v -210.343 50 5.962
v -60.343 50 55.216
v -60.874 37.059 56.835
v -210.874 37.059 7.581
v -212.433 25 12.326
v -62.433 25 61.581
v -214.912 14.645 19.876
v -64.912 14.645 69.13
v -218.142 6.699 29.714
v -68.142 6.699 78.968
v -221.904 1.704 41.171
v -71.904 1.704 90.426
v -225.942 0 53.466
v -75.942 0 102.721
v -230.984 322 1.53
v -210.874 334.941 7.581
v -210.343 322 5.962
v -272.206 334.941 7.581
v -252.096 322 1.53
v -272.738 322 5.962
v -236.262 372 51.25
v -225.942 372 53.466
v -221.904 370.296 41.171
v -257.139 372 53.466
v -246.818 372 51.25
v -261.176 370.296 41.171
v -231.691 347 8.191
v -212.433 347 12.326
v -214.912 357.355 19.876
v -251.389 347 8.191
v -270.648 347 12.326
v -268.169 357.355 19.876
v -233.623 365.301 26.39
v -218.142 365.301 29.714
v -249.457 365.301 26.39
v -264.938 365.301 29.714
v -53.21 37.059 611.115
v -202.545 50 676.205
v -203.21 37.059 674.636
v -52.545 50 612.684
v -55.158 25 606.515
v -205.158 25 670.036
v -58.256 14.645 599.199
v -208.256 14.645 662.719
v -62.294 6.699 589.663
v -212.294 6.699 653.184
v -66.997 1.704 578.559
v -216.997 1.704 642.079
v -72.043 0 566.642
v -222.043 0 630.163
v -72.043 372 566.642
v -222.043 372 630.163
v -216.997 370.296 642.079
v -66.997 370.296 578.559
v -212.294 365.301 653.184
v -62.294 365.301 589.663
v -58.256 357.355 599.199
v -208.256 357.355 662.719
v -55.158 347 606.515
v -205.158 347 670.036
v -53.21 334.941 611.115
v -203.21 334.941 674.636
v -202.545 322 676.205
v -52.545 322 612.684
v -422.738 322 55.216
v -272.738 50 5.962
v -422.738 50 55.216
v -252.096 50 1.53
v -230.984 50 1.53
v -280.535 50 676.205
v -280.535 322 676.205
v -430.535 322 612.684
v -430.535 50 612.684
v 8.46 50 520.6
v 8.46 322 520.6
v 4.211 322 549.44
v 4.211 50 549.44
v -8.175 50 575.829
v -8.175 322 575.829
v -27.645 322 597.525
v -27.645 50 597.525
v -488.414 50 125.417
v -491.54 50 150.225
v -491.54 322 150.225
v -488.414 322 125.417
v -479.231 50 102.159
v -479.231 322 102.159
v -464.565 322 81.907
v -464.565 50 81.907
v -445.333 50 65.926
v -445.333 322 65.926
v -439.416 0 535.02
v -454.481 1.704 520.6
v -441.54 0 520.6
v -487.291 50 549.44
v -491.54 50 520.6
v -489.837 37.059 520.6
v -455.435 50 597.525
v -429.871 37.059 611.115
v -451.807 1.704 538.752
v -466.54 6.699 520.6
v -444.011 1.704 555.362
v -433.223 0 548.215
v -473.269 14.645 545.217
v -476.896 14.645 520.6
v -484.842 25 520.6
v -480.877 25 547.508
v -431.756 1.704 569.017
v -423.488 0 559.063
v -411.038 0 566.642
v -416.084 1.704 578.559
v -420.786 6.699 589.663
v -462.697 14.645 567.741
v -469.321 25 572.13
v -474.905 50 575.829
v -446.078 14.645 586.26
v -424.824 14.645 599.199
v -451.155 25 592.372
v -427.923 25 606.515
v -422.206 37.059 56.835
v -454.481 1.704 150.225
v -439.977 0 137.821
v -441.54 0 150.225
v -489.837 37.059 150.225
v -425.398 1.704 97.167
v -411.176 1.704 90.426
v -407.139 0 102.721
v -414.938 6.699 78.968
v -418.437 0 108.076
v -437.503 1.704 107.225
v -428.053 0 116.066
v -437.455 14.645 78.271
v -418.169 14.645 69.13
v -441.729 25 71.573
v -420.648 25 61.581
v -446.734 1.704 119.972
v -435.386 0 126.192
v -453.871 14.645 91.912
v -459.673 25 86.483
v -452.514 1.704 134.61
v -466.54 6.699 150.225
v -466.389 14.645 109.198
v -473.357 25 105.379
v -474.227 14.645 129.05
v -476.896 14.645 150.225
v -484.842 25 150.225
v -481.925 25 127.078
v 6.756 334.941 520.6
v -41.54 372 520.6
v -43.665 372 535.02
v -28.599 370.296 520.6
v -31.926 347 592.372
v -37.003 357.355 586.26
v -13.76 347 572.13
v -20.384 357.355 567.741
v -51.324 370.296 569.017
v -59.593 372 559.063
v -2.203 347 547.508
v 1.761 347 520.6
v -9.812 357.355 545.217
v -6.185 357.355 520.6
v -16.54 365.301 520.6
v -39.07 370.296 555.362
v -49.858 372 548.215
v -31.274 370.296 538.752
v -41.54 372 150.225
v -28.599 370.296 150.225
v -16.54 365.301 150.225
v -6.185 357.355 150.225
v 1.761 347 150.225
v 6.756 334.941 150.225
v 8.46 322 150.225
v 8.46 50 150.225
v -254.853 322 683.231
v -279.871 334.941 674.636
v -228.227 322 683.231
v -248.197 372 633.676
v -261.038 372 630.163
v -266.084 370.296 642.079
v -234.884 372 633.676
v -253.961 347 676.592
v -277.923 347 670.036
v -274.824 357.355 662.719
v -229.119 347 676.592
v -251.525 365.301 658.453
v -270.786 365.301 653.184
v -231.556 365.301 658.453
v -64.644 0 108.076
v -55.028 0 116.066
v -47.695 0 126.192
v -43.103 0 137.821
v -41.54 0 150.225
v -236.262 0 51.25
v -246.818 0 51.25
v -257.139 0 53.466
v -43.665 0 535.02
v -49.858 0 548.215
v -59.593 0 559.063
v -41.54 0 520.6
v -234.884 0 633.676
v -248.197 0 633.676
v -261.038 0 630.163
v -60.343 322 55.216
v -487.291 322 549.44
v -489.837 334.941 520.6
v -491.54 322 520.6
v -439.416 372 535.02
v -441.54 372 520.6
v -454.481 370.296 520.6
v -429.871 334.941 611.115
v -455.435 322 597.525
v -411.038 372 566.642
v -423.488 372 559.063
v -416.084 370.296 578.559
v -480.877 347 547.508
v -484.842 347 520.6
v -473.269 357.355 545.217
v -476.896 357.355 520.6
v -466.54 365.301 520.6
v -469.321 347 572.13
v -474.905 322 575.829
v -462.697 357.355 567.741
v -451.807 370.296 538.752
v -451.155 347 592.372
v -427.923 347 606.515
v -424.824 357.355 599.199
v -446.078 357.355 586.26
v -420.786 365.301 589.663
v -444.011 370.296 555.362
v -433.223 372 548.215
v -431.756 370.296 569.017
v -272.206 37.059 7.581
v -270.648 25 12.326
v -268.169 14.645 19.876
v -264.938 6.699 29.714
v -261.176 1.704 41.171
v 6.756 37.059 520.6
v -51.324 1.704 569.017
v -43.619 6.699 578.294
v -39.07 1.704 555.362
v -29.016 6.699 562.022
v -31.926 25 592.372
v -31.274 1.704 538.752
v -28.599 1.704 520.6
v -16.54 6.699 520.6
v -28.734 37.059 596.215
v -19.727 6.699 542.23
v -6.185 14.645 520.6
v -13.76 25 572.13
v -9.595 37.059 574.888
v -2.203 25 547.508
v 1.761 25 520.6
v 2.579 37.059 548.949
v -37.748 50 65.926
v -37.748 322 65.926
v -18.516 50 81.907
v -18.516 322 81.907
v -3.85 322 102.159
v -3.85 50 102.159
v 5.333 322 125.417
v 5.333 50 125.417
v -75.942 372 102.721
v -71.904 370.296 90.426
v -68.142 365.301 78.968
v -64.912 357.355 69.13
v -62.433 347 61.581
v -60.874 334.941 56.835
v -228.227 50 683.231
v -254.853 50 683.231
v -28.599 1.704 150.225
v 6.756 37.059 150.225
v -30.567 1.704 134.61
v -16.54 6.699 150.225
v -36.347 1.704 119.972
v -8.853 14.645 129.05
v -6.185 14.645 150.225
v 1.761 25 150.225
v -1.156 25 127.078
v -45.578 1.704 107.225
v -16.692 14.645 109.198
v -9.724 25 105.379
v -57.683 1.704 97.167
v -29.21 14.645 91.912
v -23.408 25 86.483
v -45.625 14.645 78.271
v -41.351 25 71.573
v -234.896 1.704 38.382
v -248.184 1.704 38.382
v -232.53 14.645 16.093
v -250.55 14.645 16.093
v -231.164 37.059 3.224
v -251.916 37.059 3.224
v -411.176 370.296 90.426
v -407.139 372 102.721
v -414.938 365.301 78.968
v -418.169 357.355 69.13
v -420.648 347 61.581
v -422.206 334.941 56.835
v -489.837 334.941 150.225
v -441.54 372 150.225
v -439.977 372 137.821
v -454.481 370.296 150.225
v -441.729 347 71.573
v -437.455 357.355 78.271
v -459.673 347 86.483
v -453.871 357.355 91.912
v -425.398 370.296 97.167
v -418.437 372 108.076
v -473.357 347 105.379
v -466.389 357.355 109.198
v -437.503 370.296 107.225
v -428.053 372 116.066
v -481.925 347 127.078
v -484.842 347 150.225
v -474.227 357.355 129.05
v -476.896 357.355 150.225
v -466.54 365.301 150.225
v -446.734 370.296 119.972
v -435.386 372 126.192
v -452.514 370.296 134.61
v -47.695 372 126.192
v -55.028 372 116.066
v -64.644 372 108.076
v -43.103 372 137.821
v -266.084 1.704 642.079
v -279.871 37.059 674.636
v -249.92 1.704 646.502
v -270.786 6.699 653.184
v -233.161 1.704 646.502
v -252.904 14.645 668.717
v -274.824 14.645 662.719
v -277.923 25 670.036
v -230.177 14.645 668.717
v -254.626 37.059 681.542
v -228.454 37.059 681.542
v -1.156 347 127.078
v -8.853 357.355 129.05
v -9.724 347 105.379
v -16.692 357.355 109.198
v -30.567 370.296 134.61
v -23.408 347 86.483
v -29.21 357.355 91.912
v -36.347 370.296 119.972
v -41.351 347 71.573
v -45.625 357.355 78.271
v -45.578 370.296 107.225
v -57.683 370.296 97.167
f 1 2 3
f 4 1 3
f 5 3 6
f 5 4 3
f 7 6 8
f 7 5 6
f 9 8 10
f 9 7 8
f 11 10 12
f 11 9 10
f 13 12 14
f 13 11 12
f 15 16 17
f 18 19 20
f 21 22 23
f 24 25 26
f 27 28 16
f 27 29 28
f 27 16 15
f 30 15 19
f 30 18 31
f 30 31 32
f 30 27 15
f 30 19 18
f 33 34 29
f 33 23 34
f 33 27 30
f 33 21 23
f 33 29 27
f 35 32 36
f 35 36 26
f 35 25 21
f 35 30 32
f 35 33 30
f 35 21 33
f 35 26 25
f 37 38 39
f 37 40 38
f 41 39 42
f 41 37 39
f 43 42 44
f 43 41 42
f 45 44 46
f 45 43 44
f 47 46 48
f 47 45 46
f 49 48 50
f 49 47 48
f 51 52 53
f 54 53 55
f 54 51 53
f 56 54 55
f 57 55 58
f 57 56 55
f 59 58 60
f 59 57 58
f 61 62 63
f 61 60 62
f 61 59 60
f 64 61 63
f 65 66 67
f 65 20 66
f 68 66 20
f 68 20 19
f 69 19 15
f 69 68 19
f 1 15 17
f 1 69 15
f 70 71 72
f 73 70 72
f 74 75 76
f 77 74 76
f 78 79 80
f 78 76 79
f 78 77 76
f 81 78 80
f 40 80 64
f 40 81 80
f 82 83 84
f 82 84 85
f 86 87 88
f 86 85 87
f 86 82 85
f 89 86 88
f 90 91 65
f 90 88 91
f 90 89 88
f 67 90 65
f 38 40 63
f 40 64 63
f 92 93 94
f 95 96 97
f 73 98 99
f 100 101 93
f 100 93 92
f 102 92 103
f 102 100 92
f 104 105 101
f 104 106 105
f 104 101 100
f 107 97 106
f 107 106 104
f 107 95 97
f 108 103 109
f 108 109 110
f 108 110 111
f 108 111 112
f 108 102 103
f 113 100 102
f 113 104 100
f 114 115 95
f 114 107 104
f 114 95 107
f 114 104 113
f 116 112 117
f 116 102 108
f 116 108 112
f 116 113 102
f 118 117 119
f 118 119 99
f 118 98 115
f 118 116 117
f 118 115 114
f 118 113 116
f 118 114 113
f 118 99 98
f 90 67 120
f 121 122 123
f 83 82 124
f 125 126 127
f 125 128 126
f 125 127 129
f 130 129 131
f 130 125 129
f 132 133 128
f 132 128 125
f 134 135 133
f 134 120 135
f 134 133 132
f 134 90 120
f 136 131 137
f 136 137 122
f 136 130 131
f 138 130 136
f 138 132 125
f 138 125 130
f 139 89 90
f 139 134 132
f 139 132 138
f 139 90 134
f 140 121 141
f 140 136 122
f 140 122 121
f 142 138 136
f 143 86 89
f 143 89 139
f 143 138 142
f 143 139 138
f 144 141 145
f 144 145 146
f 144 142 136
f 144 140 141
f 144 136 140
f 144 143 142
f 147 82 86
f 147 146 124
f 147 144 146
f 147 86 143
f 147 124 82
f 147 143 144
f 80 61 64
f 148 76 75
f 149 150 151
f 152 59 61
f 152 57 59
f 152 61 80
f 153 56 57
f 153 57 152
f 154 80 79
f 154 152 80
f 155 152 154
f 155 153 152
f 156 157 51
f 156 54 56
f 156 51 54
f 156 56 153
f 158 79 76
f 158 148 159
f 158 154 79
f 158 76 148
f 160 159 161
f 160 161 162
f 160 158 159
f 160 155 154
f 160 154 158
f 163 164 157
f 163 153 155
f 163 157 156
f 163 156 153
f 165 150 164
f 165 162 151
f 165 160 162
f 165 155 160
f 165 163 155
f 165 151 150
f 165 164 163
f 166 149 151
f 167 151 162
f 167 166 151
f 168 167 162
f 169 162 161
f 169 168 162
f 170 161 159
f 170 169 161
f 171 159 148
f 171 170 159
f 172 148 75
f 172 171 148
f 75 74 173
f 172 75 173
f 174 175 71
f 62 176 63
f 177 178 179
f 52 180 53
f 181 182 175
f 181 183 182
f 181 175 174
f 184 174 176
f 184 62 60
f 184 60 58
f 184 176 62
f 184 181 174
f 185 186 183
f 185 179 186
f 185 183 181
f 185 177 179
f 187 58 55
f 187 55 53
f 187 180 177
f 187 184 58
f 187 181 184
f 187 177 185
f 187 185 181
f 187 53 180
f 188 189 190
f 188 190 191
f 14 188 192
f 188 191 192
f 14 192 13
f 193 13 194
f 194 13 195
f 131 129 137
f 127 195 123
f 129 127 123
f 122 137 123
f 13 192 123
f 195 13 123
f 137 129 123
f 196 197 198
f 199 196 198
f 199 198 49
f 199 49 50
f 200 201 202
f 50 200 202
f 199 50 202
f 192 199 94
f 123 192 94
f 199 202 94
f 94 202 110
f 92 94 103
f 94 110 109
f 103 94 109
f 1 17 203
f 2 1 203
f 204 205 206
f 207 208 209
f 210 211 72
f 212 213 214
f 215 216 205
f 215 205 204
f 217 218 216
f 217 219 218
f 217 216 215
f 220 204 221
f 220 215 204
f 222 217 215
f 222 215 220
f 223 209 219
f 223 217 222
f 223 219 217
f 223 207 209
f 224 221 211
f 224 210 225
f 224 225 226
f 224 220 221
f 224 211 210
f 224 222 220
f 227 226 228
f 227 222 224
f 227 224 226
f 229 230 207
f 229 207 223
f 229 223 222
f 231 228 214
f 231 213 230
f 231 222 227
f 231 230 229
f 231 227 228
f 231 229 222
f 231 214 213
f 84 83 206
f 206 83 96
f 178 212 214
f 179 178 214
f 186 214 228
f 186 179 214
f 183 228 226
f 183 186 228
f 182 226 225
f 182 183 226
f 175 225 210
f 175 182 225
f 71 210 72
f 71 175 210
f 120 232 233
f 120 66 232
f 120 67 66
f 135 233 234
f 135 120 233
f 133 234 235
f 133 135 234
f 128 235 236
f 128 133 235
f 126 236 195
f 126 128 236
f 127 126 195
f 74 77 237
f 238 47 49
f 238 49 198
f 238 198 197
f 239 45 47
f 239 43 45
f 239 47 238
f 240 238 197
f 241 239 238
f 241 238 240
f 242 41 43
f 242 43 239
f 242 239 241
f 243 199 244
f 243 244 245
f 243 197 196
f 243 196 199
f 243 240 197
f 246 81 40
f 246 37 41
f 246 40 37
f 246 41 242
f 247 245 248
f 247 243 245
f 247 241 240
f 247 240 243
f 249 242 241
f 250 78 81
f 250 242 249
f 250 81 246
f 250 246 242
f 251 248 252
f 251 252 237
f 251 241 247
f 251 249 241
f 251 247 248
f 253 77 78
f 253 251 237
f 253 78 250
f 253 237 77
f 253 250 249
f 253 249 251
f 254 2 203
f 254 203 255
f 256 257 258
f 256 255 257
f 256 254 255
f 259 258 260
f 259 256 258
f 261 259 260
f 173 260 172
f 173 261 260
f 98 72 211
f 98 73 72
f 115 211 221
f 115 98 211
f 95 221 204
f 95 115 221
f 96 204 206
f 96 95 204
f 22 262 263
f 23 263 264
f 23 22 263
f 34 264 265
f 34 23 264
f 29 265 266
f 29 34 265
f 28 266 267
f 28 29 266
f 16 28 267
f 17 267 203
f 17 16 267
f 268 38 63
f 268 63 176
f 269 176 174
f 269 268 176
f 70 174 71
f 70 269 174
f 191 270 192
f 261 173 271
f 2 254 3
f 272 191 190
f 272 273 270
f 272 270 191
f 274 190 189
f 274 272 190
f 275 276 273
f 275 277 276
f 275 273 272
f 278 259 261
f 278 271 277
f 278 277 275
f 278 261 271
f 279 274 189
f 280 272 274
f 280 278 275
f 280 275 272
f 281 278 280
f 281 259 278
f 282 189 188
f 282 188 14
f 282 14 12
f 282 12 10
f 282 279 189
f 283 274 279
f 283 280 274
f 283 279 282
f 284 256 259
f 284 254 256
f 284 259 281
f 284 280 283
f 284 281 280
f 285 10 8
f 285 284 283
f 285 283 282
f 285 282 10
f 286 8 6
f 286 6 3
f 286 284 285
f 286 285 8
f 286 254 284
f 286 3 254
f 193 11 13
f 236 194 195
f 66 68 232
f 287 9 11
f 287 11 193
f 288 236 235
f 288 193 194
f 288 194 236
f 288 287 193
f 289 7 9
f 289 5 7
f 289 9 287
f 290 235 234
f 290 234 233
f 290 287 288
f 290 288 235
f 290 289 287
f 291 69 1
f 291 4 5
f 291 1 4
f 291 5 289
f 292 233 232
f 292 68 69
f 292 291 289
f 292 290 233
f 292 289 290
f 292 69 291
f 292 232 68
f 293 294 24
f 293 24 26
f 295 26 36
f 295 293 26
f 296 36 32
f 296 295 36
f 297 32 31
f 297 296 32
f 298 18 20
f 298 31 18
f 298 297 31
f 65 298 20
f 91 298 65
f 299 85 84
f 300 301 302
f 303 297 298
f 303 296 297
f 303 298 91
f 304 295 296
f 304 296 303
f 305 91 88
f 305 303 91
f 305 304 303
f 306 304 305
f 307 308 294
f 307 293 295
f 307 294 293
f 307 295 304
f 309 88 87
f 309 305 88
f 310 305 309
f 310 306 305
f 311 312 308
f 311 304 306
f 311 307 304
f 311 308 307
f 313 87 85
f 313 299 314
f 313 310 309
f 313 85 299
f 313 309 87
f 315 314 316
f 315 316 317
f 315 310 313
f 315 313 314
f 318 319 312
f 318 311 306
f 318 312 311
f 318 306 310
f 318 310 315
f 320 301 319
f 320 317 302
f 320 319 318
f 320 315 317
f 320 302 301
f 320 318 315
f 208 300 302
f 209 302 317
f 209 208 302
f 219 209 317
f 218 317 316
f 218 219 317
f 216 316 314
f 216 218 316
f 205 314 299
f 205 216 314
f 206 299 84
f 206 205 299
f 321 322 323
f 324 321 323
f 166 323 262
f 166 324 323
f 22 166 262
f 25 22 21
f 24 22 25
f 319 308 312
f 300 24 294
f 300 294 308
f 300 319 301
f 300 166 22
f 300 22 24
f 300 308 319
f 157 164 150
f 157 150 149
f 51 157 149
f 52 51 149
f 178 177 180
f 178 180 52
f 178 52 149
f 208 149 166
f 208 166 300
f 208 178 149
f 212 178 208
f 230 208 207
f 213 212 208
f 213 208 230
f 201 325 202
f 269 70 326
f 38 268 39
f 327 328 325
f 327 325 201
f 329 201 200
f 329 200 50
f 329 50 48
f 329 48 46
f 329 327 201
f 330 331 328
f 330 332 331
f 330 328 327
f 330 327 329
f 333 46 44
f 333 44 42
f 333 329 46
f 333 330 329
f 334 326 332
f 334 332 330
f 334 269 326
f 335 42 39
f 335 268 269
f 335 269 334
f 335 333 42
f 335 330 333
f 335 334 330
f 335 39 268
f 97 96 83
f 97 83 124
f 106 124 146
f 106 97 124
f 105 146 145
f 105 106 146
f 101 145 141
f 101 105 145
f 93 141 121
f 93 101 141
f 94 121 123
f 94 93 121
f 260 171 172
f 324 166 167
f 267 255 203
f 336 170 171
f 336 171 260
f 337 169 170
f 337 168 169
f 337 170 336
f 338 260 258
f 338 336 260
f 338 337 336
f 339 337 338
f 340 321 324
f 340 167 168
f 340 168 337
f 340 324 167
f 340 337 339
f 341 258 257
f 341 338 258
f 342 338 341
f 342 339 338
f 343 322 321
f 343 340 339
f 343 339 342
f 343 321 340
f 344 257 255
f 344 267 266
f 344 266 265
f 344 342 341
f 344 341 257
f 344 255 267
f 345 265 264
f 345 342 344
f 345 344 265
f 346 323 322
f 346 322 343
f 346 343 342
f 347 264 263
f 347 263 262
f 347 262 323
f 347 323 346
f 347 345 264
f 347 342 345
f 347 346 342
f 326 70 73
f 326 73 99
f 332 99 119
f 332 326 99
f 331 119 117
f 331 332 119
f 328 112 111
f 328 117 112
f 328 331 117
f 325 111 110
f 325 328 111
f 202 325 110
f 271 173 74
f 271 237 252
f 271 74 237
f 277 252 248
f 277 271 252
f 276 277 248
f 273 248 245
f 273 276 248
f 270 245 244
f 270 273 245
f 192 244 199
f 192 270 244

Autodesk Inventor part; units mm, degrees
ref_plane "YZ Plane" through (0, 0, 0) normal (1, 0, 0) x (0, 1, 0)
ref_plane "XZ Plane" through (0, 0, 0) normal (0, 1, 0) x (-1, 0, 0)
ref_plane "XY Plane" through (0, 0, 0) normal (0, 0, 1) x (1, 0, 0)
sketch "Sketch1" plane through (0, 0, 0) normal (0, 1, 0) x (-1, 0, 0)
  line L0 (-8.4597, -4.2821) -> (491.5403, -4.2821)
  line L1 (491.5403, -4.2821) -> (491.5403, 692.7179)
  line L2 (491.5403, 692.7179) -> (-8.4597, 692.7179)
  line L3 (-8.4597, 692.7179) -> (-8.4597, -4.2821)
  point P0 (0, 0)
  dimension "d0" = 500
  dimension "d1" = 697
extrude "Extrusion1" add sketch "Sketch1" along normal blind 372
sketch "Sketch2" plane through (0, 372, 0) normal (0, 1, 0) x (1, 0, 0)
  line L0 (8.4597, 4.2821) -> (-491.5403, 4.2821) projected
  line L1 (-491.5403, 4.2821) -> (-491.5403, -692.7179) projected
  line L2 (-491.5403, -692.7179) -> (8.4597, -692.7179) projected
  line L3 (8.4597, -692.7179) -> (8.4597, 4.2821) projected
  line L4 (-241.5403, 4.2821) -> (-491.5403, -77.8084)
  line L5 (-241.5403, 4.2821) -> (8.4597, -77.8084)
  line L6 (8.4597, -586.8499) -> (-241.5403, -692.7179)
  line L7 (-241.5403, -692.7179) -> (-491.5403, -586.8499)
  point P0 (0, 0)
extrude "Extrusion2" cut sketch "Sketch2" against normal blind 400 contours L3 L5 L0 | L4 L1 L0 | L3 L2 L6 | L7 L2 L1
fillet "Fillet1" radius 100 6 edges at (-241.5403, 186, 692.7179) (8.4597, 186, 586.8499) (-491.5403, 186, 586.8499) (8.4597, 186, 77.8084) (-241.5403, 186, -4.2821) (-491.5403, 186, 77.8084)
fillet "Fillet2" radius 50 24 edges at (-10.5472, 372, 91.5727) (-135.3429, 372, 30.5891) (-241.5403, 372, 0.971) (-347.7376, 372, 30.5891) (-472.5333, 372, 91.5727) (-491.5403, 372, 335.4127) (-474.9054, 372, 575.8293) (-355.5351, 372, 644.4443) (-241.5403, 372, 684.121) (-127.5454, 372, 644.4443) (-8.1751, 372, 575.8293) (8.4597, 372, 335.4127) (-10.5472, 0, 91.5727) (-135.3429, 0, 30.5891) (-241.5403, 0, 0.971) (-347.7376, 0, 30.5891) (-472.5333, 0, 91.5727) (-491.5403, 0, 335.4127) (-474.9054, 0, 575.8293) (-355.5351, 0, 644.4443) (-241.5403, 0, 684.121) (-127.5454, 0, 644.4443) (-8.1751, 0, 575.8293) (8.4597, 0, 335.4127)
